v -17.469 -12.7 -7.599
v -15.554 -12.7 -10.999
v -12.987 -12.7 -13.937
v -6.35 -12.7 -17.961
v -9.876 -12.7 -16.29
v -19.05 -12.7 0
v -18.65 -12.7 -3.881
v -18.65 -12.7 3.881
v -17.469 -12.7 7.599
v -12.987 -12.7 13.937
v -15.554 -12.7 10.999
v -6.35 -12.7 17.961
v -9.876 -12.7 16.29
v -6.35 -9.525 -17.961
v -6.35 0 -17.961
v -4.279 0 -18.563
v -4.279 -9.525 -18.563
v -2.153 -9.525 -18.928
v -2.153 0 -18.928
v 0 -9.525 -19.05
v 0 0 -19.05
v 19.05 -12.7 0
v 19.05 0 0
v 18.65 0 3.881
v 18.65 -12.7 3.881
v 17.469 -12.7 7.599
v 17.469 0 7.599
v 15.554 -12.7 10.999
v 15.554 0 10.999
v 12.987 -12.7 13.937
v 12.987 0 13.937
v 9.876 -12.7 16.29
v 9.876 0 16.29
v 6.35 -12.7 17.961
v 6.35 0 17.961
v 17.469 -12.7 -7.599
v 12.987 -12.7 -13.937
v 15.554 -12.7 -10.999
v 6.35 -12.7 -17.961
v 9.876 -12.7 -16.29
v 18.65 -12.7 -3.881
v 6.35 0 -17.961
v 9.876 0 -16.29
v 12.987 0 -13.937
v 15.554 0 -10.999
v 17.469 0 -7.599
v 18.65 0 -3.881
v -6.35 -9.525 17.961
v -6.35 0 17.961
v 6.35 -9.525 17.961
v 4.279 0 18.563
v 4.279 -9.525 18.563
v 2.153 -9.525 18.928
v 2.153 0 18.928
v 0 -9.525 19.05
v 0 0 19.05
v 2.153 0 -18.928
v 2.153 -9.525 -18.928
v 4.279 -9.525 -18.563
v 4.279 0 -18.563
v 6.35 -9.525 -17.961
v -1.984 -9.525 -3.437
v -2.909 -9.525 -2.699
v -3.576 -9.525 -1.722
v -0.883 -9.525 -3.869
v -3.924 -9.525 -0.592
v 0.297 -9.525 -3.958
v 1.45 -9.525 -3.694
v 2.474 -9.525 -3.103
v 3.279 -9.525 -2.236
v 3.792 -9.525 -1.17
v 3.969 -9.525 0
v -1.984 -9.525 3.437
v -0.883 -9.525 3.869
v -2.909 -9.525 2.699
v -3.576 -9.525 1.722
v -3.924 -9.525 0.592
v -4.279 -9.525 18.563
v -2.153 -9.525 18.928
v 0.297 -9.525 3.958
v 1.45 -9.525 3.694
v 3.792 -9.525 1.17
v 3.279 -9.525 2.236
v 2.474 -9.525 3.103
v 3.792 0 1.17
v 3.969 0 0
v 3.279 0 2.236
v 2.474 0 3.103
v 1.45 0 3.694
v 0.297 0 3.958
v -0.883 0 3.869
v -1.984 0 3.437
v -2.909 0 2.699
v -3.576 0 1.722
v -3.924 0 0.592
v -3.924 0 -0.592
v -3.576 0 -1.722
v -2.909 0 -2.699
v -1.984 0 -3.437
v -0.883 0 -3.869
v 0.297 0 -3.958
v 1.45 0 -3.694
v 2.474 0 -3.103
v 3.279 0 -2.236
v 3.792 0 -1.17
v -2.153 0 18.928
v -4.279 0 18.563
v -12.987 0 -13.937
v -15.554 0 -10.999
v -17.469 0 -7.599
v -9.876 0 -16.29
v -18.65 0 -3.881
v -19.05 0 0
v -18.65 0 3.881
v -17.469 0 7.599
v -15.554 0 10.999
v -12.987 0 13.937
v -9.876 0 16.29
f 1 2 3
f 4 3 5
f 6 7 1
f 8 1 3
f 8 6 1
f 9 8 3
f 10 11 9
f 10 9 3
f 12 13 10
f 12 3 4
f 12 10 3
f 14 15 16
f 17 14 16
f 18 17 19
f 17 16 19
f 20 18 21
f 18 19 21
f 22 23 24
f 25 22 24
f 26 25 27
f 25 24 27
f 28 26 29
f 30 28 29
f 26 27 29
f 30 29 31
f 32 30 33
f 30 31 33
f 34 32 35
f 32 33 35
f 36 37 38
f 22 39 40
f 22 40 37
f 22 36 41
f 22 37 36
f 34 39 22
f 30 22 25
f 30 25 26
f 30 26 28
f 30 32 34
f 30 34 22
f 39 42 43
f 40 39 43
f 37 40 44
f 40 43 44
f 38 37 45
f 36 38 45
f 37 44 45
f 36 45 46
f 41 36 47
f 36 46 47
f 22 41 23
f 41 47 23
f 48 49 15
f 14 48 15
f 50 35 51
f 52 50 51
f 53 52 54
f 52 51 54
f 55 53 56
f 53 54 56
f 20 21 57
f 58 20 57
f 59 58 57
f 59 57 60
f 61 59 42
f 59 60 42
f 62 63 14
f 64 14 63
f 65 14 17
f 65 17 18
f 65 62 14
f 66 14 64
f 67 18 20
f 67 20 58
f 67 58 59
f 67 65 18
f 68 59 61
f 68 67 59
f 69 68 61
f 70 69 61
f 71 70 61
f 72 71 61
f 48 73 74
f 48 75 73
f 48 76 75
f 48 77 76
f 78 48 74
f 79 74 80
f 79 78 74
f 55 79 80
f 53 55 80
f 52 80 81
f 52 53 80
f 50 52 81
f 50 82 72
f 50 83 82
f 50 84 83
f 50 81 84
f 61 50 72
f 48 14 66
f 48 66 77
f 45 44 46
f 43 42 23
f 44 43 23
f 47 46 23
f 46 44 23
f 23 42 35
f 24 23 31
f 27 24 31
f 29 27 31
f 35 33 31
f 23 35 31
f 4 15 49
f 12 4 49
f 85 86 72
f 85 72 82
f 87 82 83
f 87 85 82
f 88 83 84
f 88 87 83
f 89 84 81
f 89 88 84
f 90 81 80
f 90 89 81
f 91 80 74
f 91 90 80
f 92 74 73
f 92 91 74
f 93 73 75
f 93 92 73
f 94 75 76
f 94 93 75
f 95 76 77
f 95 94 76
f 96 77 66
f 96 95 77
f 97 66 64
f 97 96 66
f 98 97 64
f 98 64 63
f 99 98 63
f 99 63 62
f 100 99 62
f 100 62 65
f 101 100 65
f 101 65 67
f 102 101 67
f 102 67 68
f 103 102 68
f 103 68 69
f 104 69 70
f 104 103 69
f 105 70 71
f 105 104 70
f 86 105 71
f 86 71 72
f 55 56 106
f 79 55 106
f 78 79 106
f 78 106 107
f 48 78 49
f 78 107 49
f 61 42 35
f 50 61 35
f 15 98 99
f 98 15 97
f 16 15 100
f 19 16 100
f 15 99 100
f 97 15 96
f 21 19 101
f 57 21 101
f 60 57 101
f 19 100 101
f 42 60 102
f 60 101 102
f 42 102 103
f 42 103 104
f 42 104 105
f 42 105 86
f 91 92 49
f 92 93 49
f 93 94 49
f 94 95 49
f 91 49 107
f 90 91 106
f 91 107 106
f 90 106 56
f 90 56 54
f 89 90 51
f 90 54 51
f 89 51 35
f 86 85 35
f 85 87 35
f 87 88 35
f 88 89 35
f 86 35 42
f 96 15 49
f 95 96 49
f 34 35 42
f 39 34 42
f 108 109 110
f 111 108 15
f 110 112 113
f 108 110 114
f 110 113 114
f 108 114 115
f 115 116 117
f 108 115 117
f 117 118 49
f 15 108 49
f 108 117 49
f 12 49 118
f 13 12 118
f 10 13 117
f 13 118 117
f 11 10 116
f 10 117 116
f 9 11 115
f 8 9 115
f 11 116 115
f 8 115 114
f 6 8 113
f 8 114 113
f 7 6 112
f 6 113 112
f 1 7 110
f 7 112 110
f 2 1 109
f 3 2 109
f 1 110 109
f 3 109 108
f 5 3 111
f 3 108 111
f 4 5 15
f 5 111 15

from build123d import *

# Parameters (mm, degrees)
F1_DEPTH = 12.7
F0_R     = 3.96875
F2_DEPTH = 9.525
F3_DEPTH = 62


# Not quite as in the source:
# - an extrude ends at something that could not be found from the text; its depth is read off the source's solid


with BuildPart() as f1:
    # F0 (on Front) → F1 (new body)
    with BuildSketch(Plane.XZ):
        with BuildLine():
            ThreePointArc((6.35, -17.9605122421), (15.5542598667, -10.9985226281), (19.05, 0))
            ThreePointArc((19.05, 0), (15.5542598667, 10.9985226281), (6.35, 17.9605122421))
            Line((6.35, 17.9605122421), (6.35, -17.9605122421))
        make_face()
    extrude(amount=F1_DEPTH)

    # F0 (on Front) → F3 (cut, through all)
    with BuildSketch(Plane.XZ):
        Circle(F0_R)
    extrude(amount=-F3_DEPTH, mode=Mode.SUBTRACT)


with BuildPart() as f1b:
    # F0 (on Front) → F1, piece 2 (new body)
    with BuildSketch(Plane.XZ):
        with BuildLine():
            Line((-6.35, -17.9605122421), (-6.35, 17.9605122421))
            ThreePointArc((-6.35, 17.9605122421), (-19.05, 0), (-6.35, -17.9605122421))
        make_face()
    extrude(amount=F1_DEPTH)


with BuildPart() as f2:
    # F0 (on Front) → F2 (new body)
    with BuildSketch(Plane.XZ):
        with BuildLine():
            Line((6.35, -17.9605122421), (6.35, 17.9605122421))
            ThreePointArc((6.35, 17.9605122421), (3.2213926947, 18.7756525614), (0, 19.05))
            ThreePointArc((0, 19.05), (-3.2213926947, 18.7756525614), (-6.35, 17.9605122421))
            Line((-6.35, 17.9605122421), (-6.35, -17.9605122421))
            ThreePointArc((-6.35, -17.9605122421), (-3.2213926947, -18.7756525614), (0, -19.05))
            ThreePointArc((0, -19.05), (3.2213926947, -18.7756525614), (6.35, -17.9605122421))
        make_face()
        Circle(F0_R, mode=Mode.SUBTRACT)
    extrude(amount=F2_DEPTH)


solid = Compound([f1.part, f1b.part, f2.part])
